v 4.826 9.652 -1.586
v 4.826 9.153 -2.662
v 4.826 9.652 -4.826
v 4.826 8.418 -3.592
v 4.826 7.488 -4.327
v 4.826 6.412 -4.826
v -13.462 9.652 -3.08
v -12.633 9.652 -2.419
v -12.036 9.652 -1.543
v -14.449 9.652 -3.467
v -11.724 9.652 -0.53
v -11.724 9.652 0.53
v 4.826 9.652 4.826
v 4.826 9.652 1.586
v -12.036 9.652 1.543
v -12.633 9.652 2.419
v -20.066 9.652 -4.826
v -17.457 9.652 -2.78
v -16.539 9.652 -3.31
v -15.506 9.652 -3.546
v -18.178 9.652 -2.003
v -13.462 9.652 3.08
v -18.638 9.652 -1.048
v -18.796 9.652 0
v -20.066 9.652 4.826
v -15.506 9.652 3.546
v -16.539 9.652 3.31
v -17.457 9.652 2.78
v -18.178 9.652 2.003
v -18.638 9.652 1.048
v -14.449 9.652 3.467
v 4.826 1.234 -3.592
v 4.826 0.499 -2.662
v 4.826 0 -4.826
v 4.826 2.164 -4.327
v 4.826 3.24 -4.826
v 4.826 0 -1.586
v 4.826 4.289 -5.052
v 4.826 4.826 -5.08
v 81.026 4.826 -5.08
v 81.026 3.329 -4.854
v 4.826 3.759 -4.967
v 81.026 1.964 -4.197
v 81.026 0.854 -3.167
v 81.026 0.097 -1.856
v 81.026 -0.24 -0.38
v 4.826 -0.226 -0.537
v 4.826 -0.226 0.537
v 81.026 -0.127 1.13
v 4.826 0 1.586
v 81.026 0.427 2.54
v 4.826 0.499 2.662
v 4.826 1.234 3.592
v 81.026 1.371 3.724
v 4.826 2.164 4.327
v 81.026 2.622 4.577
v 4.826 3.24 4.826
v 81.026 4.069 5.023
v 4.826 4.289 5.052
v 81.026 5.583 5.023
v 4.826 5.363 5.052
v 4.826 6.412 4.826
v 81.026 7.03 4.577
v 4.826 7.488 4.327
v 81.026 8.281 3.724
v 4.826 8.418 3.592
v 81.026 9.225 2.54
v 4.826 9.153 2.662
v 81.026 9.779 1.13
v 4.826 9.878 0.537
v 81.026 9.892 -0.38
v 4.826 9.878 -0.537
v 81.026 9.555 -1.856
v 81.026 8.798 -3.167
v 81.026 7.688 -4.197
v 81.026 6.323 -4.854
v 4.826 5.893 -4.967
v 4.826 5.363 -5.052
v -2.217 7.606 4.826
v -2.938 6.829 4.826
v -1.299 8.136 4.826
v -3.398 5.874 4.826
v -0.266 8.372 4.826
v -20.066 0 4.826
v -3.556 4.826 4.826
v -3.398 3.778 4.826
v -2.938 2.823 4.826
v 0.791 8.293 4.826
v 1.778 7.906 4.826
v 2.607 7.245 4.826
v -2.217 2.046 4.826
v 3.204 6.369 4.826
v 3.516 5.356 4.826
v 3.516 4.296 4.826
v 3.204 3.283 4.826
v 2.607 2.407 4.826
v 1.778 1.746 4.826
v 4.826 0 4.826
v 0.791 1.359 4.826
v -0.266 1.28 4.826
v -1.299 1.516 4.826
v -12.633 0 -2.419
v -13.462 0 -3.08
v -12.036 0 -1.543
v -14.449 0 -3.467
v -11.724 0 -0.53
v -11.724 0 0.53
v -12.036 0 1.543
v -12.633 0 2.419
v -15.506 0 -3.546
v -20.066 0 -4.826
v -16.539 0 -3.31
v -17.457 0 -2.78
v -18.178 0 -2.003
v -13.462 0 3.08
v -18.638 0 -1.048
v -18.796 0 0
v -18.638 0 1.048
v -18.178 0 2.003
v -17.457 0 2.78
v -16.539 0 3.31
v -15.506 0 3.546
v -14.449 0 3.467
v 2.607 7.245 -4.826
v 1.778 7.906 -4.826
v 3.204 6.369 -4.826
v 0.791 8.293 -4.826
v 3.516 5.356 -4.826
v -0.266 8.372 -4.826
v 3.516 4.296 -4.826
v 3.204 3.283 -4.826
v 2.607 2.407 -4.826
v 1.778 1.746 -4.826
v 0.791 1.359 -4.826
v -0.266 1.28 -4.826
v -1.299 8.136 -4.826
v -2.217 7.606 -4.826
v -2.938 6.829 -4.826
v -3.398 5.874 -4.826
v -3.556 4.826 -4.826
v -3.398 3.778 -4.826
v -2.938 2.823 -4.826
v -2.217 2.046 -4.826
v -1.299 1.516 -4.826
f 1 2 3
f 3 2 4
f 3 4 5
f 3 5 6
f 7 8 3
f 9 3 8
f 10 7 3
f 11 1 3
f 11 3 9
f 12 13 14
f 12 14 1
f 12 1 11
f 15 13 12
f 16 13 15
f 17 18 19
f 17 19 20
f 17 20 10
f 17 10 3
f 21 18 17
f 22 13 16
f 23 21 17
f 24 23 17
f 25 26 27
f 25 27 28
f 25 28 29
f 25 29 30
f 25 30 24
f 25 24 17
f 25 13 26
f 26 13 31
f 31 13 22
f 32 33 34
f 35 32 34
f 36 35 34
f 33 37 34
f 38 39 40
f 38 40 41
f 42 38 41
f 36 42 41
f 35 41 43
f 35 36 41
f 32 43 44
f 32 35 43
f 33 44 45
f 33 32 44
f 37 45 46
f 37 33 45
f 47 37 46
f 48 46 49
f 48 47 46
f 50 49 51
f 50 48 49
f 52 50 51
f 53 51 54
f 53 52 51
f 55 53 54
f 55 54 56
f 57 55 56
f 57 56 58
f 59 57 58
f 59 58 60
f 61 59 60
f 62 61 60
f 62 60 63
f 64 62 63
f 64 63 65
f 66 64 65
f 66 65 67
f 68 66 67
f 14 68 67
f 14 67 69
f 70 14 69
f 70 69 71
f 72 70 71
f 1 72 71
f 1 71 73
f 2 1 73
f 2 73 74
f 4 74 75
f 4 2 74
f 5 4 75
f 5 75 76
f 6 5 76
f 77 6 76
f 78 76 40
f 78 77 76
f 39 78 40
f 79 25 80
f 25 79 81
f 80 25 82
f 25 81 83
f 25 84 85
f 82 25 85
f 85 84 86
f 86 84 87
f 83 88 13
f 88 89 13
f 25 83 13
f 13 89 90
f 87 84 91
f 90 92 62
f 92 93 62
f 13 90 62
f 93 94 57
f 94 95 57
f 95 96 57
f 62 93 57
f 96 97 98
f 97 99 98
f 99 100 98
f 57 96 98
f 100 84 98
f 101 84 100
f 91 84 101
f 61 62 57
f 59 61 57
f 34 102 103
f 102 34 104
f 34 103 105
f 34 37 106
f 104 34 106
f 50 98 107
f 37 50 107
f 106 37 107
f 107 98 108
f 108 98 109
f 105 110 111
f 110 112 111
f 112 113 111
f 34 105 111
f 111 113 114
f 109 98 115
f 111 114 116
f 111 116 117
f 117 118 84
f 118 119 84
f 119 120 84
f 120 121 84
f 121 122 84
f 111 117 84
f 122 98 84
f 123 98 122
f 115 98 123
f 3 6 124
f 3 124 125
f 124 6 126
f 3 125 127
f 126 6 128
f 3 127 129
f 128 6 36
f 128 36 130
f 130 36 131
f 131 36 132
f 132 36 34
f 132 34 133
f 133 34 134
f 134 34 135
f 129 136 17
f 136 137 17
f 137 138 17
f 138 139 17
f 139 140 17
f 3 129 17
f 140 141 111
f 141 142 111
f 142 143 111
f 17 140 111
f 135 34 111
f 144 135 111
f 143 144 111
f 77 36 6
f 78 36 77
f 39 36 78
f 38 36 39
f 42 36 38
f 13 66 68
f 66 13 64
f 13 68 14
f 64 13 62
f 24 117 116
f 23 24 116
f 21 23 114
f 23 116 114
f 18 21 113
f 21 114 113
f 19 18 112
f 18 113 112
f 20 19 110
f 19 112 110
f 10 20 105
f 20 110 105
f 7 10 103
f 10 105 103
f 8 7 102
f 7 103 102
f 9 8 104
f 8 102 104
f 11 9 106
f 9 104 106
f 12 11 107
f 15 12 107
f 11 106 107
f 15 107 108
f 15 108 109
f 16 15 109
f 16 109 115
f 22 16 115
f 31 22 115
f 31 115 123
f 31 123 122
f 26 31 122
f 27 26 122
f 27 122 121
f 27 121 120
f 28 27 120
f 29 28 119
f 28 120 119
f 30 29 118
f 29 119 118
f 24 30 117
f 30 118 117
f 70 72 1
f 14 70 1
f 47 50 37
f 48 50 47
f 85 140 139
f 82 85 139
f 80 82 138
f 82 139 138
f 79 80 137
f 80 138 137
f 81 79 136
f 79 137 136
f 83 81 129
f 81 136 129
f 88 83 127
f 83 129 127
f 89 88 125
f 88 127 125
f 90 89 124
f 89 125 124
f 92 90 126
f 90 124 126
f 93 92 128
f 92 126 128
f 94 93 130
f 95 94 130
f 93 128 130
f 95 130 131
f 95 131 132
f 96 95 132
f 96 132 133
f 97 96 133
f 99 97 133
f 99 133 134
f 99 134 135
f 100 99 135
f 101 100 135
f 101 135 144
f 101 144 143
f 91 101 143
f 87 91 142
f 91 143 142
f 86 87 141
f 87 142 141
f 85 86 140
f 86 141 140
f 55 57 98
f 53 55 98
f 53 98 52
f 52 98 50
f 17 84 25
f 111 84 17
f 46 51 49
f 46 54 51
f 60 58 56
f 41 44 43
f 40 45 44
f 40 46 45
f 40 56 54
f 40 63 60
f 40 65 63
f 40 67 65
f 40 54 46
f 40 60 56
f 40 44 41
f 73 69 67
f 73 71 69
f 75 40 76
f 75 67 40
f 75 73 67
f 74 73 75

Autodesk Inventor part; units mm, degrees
ref_plane "YZ Plane" through (0, 0, 0) normal (1, 0, 0) x (0, 1, 0)
ref_plane "XZ Plane" through (0, 0, 0) normal (0, 1, 0) x (-1, 0, 0)
ref_plane "XY Plane" through (0, 0, 0) normal (0, 0, 1) x (1, 0, 0)
sketch "Sketch1" plane through (0, 0, 0) normal (0, 1, 0) x (-1, 0, 0)
  line L0 (0, 0) -> (15.24, 0)
  circle A0 centre (15.24, 0) radius 3.556
  circle A1 centre (0, 0) radius 3.556
  line L1 (18.796, 0) -> (20.066, 0)
  line L2 (15.24, -3.556) -> (15.24, -4.826)
  line L3 (15.24, -4.826) -> (0, -4.826)
  line L4 (-3.556, 0) -> (-4.826, 0)
  line L5 (-4.826, 0) -> (-4.826, -4.826)
  line L6 (-4.826, -4.826) -> (0, -4.826)
  line L7 (15.24, -4.826) -> (20.066, -4.826)
  line L8 (20.066, -4.826) -> (20.066, 0)
  line L9 (15.24, 3.556) -> (15.24, 4.826)
  line L10 (15.24, 4.826) -> (20.066, 4.826)
  line L11 (20.066, 4.826) -> (-4.826, 4.826)
  line L12 (-4.826, 4.826) -> (-4.826, 0)
  line L13 (0, -4.826) -> (-4.826, -4.826)
  line L14 (20.066, 4.826) -> (20.066, 0)
  dimension "d2" = 7.112
  dimension "d0" = 15.24
  dimension "d1" = 7.112
  dimension "d3" = 1.27
  dimension "d4" = 1.27
  dimension "d5" = 1.27
  dimension "d6" = 1.27
extrude "Extrusion1" add sketch "Sketch1" along normal blind 9.652 contours A1 L4 L12 L11 L9 A0 L0 | A1 | L0 A0 L2 L3 L6 L5 L4 A1 | L9 L10 L14 L1 A0 | A0 L1 L8 L7 L2
sketch "Sketch2" plane through (4.826, 0, -4.826) normal (0, 0, -1) x (-1, 0, 0)
  line L0 (0, 0) -> (0, 9.652) projected
  line L1 (0, 4.826) -> (4.826, 4.826)
  circle A0 centre (4.826, 4.826) radius 3.556
  point P0 (4.826, 0)
  dimension "d9" = 4.826
  dimension "d10" = 7.112
extrude "Extrusion2" cut sketch "Sketch2" against normal through all
sketch "Sketch3" plane through (4.826, 0, 4.826) normal (1, 0, 0) x (0, 0, -1)
  line L0 (4.826, 0) -> (4.826, 9.652)
  line L1 (0, 9.652) -> (9.652, 9.652) projected
  line L2 (0, 0) -> (0, 9.652) projected
  line L3 (0, 4.826) -> (9.652, 4.826)
  line L4 (9.652, 0) -> (9.652, 9.652) projected
  circle A0 centre (4.826, 4.826) radius 5.08
  dimension "d13" = 10.16
extrude "Extrusion3" add sketch "Sketch3" along normal blind 76.2 contours L3 L2 A0 L1 L0 | L3 L4 A0 L2 | L0 L1 A0 L4 L3 | L1 A0 | L2 A0 | L4 A0
sketch "Sketch4" plane through (81.026, 4.826, 0) normal (1, 0, 0) x (0, 0, -1)
  circle A0 centre (0, 0) radius 5.08
  point P0 (0, -4.826)
extrude "Extrusion4" cut sketch "Sketch4" against normal blind 76.2
sketch "Sketch5" plane through (4.826, 0, 4.826) normal (1, 0, 0) x (0, 0, -1)
  line L0 (9.652, 9.652) -> (0, 9.652) projected
  line L1 (4.826, 9.652) -> (4.826, 0)
  circle A0 centre (4.826, 4.826) radius 5.08
  dimension "d18" = 10.16
extrude "Extrusion5" add sketch "Sketch5" along normal blind 76.2
properties part number "newblock"
